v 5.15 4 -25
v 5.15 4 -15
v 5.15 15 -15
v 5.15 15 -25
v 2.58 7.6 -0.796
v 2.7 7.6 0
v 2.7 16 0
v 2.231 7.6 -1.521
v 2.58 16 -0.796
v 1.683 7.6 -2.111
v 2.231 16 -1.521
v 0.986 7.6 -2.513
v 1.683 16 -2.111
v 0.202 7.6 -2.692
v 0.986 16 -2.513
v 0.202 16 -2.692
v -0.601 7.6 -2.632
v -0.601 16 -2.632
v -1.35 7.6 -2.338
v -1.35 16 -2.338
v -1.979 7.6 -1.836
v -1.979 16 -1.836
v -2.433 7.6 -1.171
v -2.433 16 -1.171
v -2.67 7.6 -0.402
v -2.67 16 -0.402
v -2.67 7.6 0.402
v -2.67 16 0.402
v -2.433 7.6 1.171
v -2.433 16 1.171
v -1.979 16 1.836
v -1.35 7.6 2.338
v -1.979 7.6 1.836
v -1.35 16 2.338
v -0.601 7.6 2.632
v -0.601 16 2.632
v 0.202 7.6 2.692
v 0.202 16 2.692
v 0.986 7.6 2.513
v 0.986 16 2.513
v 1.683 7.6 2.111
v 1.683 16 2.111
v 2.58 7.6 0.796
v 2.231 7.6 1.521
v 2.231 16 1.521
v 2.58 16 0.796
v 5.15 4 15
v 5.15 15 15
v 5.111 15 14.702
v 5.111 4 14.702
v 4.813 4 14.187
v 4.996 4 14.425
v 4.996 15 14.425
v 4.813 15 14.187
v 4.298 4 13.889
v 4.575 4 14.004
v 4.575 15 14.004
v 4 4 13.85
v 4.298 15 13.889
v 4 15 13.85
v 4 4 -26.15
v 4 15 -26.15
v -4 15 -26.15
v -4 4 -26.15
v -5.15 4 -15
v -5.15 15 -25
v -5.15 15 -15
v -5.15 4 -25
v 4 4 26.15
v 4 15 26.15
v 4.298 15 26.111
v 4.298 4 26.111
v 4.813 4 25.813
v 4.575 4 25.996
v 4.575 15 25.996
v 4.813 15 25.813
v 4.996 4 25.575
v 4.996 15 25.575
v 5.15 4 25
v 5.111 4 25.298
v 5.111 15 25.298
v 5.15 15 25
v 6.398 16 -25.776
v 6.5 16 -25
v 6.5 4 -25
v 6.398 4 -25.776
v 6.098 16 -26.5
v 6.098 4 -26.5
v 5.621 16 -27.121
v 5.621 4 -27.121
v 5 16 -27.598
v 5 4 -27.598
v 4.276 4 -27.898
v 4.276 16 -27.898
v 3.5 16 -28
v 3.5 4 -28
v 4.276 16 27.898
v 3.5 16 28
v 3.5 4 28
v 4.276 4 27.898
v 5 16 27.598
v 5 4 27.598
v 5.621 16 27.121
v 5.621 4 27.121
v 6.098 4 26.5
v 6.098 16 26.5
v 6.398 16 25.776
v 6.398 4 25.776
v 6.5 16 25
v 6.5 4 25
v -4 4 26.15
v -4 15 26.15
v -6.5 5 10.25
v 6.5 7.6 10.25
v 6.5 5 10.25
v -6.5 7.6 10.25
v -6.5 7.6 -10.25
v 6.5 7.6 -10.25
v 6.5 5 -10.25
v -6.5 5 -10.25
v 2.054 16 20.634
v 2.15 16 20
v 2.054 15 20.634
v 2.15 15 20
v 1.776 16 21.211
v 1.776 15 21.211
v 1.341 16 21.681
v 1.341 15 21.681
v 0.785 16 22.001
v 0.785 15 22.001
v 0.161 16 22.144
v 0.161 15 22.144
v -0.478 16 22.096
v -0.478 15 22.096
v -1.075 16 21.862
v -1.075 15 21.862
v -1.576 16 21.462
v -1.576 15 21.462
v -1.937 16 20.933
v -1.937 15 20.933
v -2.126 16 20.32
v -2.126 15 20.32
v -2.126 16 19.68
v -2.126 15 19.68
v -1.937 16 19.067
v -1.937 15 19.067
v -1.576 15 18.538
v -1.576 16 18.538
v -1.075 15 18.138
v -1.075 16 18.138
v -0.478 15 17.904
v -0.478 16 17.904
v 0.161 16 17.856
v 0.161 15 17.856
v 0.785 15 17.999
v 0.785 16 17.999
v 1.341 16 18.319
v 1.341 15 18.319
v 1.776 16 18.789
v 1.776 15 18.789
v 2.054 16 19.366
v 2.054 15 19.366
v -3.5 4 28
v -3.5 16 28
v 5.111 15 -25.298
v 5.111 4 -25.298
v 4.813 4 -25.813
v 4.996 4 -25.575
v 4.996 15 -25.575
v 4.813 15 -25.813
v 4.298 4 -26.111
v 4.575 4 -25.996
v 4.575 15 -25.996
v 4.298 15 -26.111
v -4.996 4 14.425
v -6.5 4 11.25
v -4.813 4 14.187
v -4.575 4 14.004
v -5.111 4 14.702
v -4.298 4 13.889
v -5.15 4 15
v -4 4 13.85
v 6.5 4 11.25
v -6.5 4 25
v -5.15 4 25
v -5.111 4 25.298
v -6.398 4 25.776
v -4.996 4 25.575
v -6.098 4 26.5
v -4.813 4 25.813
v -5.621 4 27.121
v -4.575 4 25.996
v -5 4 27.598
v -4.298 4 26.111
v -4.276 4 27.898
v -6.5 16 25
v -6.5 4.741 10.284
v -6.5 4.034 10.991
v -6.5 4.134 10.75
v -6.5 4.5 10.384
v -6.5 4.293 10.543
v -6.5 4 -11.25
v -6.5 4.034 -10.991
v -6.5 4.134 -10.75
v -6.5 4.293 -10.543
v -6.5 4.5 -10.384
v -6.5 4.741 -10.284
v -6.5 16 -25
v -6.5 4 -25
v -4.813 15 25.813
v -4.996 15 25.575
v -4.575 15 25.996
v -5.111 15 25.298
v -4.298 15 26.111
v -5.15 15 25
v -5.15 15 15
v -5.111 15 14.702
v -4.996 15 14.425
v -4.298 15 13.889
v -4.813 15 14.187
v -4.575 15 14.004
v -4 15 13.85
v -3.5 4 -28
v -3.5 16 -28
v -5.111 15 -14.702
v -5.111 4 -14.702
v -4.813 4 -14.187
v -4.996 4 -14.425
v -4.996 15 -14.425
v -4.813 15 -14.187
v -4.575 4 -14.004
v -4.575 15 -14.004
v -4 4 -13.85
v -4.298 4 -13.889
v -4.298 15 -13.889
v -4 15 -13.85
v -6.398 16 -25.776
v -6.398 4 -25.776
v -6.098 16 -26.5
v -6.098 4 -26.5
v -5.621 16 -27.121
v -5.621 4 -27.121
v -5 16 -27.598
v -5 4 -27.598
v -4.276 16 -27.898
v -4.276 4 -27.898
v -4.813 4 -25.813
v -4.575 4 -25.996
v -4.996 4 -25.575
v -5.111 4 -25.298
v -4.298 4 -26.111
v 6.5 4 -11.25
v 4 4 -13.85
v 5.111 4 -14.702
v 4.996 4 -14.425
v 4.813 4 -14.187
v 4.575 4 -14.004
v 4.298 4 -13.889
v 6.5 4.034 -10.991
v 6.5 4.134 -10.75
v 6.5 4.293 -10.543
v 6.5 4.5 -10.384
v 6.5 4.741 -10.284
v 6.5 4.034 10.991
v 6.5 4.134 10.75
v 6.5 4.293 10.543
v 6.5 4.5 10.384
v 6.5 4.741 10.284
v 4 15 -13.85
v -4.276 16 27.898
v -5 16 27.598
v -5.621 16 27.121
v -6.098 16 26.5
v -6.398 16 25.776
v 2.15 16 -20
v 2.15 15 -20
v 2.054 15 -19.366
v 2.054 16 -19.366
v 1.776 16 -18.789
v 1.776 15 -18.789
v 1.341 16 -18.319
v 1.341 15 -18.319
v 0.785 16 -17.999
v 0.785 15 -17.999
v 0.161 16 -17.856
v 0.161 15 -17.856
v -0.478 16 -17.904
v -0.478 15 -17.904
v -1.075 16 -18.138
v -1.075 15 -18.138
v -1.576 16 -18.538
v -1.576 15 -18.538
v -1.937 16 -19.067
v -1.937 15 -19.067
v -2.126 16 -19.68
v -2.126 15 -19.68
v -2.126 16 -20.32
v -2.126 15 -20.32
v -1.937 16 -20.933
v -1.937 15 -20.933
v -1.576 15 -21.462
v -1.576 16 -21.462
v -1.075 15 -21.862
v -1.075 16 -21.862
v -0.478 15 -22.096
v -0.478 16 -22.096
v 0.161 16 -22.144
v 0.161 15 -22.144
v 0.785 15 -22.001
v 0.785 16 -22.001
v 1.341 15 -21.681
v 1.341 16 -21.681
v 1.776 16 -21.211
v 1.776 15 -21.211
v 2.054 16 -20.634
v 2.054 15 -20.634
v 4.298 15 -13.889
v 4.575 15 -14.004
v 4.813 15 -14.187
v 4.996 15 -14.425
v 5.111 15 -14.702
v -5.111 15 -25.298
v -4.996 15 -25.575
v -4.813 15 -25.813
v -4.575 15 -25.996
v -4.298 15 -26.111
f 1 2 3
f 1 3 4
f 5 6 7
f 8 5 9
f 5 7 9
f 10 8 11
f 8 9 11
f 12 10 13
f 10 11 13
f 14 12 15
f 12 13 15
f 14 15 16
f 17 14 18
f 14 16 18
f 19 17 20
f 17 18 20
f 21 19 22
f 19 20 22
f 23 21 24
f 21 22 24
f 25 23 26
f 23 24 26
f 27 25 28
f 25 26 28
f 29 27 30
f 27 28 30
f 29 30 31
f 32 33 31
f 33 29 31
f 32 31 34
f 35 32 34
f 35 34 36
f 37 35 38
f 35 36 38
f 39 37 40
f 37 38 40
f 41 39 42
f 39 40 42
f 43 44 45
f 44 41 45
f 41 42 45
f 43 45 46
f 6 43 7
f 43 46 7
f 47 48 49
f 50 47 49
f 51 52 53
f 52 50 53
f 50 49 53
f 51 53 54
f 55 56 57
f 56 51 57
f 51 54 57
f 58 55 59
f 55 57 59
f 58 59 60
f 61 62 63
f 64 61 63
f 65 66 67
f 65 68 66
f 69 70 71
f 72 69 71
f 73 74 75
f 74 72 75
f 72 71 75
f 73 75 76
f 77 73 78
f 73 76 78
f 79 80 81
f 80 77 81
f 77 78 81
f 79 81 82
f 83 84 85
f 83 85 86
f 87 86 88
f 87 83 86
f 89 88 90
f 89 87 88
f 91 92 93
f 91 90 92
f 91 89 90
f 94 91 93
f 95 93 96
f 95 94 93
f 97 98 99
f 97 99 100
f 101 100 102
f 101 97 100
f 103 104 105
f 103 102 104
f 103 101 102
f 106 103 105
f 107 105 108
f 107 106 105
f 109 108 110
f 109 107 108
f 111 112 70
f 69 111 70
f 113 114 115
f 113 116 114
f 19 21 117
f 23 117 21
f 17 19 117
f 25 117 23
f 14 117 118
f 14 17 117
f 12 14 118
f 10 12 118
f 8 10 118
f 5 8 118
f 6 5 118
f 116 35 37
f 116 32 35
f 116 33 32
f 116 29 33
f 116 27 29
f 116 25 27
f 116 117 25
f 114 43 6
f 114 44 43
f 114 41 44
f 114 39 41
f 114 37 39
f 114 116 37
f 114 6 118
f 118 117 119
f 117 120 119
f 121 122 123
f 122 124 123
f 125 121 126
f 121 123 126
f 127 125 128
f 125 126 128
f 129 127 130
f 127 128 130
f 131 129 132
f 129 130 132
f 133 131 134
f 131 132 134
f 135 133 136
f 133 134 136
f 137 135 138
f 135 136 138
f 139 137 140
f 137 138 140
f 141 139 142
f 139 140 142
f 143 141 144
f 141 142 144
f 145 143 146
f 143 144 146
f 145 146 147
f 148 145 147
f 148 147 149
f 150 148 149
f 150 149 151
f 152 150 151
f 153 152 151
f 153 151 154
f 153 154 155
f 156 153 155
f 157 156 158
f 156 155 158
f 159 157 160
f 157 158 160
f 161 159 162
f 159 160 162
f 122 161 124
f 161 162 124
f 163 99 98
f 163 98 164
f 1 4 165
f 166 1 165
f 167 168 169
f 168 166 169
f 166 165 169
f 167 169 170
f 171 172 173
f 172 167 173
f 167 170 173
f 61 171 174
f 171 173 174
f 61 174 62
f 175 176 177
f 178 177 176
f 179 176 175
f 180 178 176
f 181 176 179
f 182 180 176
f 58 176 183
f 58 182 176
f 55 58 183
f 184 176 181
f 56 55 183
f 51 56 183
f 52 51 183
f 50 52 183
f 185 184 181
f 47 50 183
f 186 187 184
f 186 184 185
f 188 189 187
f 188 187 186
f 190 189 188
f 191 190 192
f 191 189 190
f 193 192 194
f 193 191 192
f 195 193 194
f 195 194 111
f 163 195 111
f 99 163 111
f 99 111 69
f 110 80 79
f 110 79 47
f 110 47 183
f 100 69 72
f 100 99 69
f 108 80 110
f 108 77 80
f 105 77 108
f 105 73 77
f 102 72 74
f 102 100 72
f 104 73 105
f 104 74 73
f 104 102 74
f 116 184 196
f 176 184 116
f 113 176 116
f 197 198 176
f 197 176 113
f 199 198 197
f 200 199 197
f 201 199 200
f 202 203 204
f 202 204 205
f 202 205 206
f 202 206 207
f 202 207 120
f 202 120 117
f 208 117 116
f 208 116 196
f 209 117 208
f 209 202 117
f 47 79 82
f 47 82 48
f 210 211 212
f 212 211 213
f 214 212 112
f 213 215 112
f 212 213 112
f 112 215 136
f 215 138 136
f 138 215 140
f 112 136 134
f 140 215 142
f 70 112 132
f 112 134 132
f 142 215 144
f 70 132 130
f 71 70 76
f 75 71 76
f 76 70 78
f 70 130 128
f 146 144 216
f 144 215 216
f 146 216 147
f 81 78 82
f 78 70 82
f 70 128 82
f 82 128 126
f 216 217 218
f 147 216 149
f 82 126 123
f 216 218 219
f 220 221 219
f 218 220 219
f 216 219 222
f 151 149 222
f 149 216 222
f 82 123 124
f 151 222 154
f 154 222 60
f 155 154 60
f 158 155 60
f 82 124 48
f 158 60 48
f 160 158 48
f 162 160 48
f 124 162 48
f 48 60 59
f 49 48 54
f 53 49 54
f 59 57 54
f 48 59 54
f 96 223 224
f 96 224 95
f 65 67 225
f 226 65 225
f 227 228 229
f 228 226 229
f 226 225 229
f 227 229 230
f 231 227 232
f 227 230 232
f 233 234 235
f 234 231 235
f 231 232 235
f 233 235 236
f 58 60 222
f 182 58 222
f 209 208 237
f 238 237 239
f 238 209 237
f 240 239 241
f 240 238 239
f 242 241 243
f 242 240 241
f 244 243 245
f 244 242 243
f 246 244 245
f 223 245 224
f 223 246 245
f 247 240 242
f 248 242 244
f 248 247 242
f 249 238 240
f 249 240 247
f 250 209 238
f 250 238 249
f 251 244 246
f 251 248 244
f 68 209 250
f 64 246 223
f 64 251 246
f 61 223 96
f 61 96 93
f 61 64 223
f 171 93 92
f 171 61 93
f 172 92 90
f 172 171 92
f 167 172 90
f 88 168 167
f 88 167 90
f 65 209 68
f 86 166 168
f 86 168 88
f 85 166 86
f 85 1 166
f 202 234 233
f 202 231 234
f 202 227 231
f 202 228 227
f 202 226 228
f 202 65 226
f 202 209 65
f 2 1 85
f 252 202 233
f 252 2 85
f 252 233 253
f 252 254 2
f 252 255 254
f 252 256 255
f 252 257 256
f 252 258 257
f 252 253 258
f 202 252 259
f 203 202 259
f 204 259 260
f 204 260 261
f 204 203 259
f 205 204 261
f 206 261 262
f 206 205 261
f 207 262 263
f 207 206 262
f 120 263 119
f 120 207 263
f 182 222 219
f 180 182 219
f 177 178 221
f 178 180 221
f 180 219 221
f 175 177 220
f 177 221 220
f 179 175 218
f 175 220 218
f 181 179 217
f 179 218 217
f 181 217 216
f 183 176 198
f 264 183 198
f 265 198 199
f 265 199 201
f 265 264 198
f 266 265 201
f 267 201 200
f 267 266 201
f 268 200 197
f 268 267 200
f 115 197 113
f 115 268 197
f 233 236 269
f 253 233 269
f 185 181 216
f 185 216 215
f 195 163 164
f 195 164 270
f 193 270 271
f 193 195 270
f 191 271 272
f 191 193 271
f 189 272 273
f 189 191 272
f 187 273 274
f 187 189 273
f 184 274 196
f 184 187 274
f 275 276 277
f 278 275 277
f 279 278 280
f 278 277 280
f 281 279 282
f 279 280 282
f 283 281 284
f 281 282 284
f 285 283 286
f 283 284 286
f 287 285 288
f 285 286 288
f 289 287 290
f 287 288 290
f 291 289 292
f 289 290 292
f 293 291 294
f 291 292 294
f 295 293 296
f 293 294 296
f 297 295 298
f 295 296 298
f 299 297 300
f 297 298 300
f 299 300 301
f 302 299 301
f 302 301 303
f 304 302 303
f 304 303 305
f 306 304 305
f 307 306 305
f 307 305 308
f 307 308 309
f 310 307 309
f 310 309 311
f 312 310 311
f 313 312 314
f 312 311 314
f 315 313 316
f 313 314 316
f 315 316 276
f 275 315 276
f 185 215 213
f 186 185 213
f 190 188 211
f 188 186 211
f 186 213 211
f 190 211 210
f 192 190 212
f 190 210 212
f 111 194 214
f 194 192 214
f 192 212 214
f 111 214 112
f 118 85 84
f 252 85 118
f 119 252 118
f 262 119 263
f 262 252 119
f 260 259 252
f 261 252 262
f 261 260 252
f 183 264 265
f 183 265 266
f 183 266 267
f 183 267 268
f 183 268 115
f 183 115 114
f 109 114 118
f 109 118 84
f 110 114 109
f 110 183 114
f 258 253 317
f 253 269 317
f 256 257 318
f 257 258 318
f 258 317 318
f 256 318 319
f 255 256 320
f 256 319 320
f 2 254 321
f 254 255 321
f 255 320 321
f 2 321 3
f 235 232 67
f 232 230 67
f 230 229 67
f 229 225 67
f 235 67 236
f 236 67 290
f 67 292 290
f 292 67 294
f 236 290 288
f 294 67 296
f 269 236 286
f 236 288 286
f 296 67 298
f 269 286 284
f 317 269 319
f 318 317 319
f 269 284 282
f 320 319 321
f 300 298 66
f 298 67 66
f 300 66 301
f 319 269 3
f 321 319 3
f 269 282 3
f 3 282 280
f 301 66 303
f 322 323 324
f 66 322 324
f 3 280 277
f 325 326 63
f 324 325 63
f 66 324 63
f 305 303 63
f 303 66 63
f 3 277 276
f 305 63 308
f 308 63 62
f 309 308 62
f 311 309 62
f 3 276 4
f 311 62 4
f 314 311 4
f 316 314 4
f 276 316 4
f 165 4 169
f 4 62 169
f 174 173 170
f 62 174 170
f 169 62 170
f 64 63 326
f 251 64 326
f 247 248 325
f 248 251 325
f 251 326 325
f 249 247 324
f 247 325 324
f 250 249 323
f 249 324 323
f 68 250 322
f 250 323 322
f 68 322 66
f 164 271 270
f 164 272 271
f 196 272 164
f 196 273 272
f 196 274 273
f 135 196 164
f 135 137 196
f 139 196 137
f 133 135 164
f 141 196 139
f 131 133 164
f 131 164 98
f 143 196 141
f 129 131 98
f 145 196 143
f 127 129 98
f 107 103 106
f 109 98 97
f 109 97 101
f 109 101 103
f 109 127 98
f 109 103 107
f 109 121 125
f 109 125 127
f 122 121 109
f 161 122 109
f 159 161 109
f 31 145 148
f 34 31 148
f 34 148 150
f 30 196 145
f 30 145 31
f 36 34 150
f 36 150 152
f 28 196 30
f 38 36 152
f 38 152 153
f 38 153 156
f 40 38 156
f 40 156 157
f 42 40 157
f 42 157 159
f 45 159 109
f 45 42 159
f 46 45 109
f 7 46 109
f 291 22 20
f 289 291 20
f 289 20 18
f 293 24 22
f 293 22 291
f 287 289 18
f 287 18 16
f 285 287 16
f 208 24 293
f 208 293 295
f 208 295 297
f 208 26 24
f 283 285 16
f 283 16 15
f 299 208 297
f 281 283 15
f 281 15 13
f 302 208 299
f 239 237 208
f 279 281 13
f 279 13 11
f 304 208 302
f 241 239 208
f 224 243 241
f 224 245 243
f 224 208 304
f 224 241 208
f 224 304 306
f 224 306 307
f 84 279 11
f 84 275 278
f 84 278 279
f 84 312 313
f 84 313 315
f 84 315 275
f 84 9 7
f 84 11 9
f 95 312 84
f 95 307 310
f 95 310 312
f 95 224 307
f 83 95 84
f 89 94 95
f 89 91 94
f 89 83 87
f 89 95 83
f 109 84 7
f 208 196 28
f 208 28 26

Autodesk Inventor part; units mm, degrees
ref_plane "YZ Plane" through (0, 0, 0) normal (1, 0, 0) x (0, 1, 0)
ref_plane "XZ Plane" through (0, 0, 0) normal (0, 1, 0) x (-1, 0, 0)
ref_plane "XY Plane" through (0, 0, 0) normal (0, 0, 1) x (1, 0, 0)
sketch "Boceto1" plane through (0, 0, 0) normal (0, 1, 0) x (-1, 0, 0)
  line L0 (-6.5, 28) -> (6.5, 28)
  line L1 (6.5, 28) -> (6.5, -28)
  line L2 (6.5, -28) -> (-6.5, -28)
  line L3 (-6.5, -28) -> (-6.5, 28)
  line L4 (-6.5, 28) -> (6.5, -28) construction
  line L5 (6.5, 28) -> (-6.5, -28) construction
  line L6 (5.15, 26.15) -> (-5.15, 26.15)
  line L7 (-5.15, 26.15) -> (-5.15, 13.85)
  line L8 (-5.15, 13.85) -> (5.15, 13.85)
  line L9 (5.15, 13.85) -> (5.15, 26.15)
  line L10 (5.15, 26.15) -> (-5.15, 13.85) construction
  line L11 (-5.15, 26.15) -> (5.15, 13.85) construction
  line L12 (5.15, -13.85) -> (-5.15, -13.85)
  line L13 (-5.15, -13.85) -> (-5.15, -26.15)
  line L14 (-5.15, -26.15) -> (5.15, -26.15)
  line L15 (5.15, -26.15) -> (5.15, -13.85)
  line L16 (5.15, -13.85) -> (-5.15, -26.15) construction
  line L17 (-5.15, -13.85) -> (5.15, -26.15) construction
  point P0 (0, 0)
  point P1 (0, 20)
  point P2 (0, -20)
  point P3 (0, 20)
  point P4 (0, 0)
  point P5 (0, -20)
  point P6 (0, 0)
  dimension "d0" = 12.3
  dimension "d1" = 10.3
  dimension "d2" = 20
  dimension "d3" = 56
  dimension "d4" = 20
  dimension "d5" = 13
extrude "Extrusión1" add sketch "Boceto1" along normal blind 15
sketch "Boceto2" plane through (0, 15, 0) normal (0, 1, 0) x (1, 0, 0)
  line L0 (6.5, 28) -> (-6.5, 28) projected
  line L1 (-6.5, 28) -> (-6.5, -28) projected
  line L2 (-6.5, -28) -> (6.5, -28) projected
  line L3 (6.5, -28) -> (6.5, 28) projected
  line L4 (-5.15, -26.15) -> (-5.15, -13.85) projected
  line L5 (-5.15, -13.85) -> (5.15, -13.85) projected
  line L6 (5.15, -13.85) -> (5.15, -26.15) projected
  line L7 (5.15, -26.15) -> (-5.15, -26.15) projected
  line L8 (-5.15, 13.85) -> (-5.15, 26.15) projected
  line L9 (-5.15, 26.15) -> (5.15, 26.15) projected
  line L10 (5.15, 26.15) -> (5.15, 13.85) projected
  line L11 (5.15, 13.85) -> (-5.15, 13.85) projected
  point P0 (0, 0)
extrude "Extrusión2" add sketch "Boceto2" along normal blind 1 contours L3 L2 L1 L0 | L4 L5 L6 L7 | L8 L9 L10 L11
sketch "Boceto3" plane through (0, 0, 0) normal (0, -1, 0) x (1, 0, 0)
  circle A0 centre (0, 20) radius 2.15
  circle A1 centre (0, -20) radius 2.15
  line L0 (-5.15, 13.85) -> (5.15, 13.85) projected
  line L1 (5.15, -13.85) -> (-5.15, -13.85) projected
  line L2 (5.15, 13.85) -> (5.15, 26.15) projected
  point P0 (0, 0)
  dimension "d10" = 4.3
  dimension "d11" = 6.15
  dimension "d12" = 6.15
  dimension "d13" = 5.15
extrude "Extrusión3" cut sketch "Boceto3" against normal through all
fillet "Empalme1" radius 1.15 8 edges at (5.15, 7.5, -13.85) (5.15, 7.5, 26.15) (5.15, 7.5, 13.85) (5.15, 7.5, -26.15) (-5.15, 7.5, -26.15) (-5.15, 7.5, 13.85) (-5.15, 7.5, -13.85) (-5.15, 7.5, 26.15)
fillet "Empalme2" radius 3 4 edges at (6.5, 8, -28) (6.5, 8, 28) (-6.5, 8, 28) (-6.5, 8, -28)
sketch "Boceto6" plane through (-6.5, 0, -25) normal (-1, 0, 0) x (0, 0, 1)
  line L0 (35.25, -7) -> (14.75, -7)
  line L1 (14.75, -7) -> (14.75, 7)
  line L2 (14.75, 7) -> (35.25, 7)
  line L3 (35.25, 7) -> (35.25, -7)
  line L4 (35.25, -7) -> (14.75, 7) construction
  line L5 (14.75, -7) -> (35.25, 7) construction
  point P0 (25, 0)
  dimension "d30" = 20.5
  dimension "d31" = 7
extrude "Extrusión6" cut sketch "Boceto6" against normal through all
sketch "Boceto7" plane through (0, 16, 0) normal (0, 1, 0) x (1, 0, 0)
  circle A0 centre (0, 0) radius 2.7
  dimension "d35" = 5.4
extrude "Extrusión7" cut sketch "Boceto7" against normal through all
sketch "Boceto8" plane through (0, 0, 0) normal (0, -1, 0) x (1, 0, 0)
  line L0 (4, -13.85) -> (-4, -13.85) projected
  arc A0 (5.15, -15) -> (4, -13.85) centre (4, -15) ccw projected
  line L1 (5.15, -25) -> (5.15, -15) projected
  arc A1 (4, -26.15) -> (5.15, -25) centre (4, -25) ccw projected
  line L2 (-4, -26.15) -> (4, -26.15) projected
  arc A2 (-5.15, -25) -> (-4, -26.15) centre (-4, -25) ccw projected
  line L3 (-5.15, -15) -> (-5.15, -25) projected
  arc A3 (-4, -13.85) -> (-5.15, -15) centre (-4, -15) ccw projected
  line L4 (6.5, -10.25) -> (-6.5, -10.25) projected
  line L5 (-6.5, -25) -> (-6.5, -10.25) projected
  arc A4 (-6.5, -25) -> (-3.5, -28) centre (-3.5, -25) ccw projected
  line L6 (3.5, -28) -> (-3.5, -28) projected
  arc A5 (3.5, -28) -> (6.5, -25) centre (3.5, -25) ccw projected
  line L7 (6.5, -10.25) -> (6.5, -25) projected
  line L8 (-6.5, 10.25) -> (6.5, 10.25) projected
  line L9 (6.5, 25) -> (6.5, 10.25) projected
  arc A6 (6.5, 25) -> (3.5, 28) centre (3.5, 25) ccw projected
  line L10 (-3.5, 28) -> (3.5, 28) projected
  arc A7 (-3.5, 28) -> (-6.5, 25) centre (-3.5, 25) ccw projected
  line L11 (-6.5, 10.25) -> (-6.5, 25) projected
  line L12 (4, 26.15) -> (-4, 26.15) projected
  arc A8 (5.15, 25) -> (4, 26.15) centre (4, 25) ccw projected
  line L13 (5.15, 15) -> (5.15, 25) projected
  arc A9 (4, 13.85) -> (5.15, 15) centre (4, 15) ccw projected
  line L14 (-4, 13.85) -> (4, 13.85) projected
  arc A10 (-5.15, 15) -> (-4, 13.85) centre (-4, 15) ccw projected
  line L15 (-5.15, 25) -> (-5.15, 15) projected
  arc A11 (-4, 26.15) -> (-5.15, 25) centre (-4, 25) ccw projected
  point P0 (0, 0)
extrude "Extrusión8" cut sketch "Boceto8" against normal blind 4
fillet "Empalme5" radius 1 2 edges at (0, 4, -10.25) (0, 4, 10.25)
sketch "Boceto9" plane through (-6.5, 7, -10.25) normal (0, -1, 0) x (1, 0, 0)
  circle A0 centre (6.5, 10.25) radius 2.7 projected
  line L0 (13, 20.5) -> (13, 0) projected
  line L1 (0, 20.5) -> (13, 20.5) projected
  line L2 (0, 0) -> (0, 20.5) projected
  line L3 (0, 0) -> (13, 0) projected
  point P0 (6.5, 10.25)
extrude "Extrusión9" cut sketch "Boceto9" against normal blind 0.6
sketch "Boceto4" plane through (0, 16, 0) normal (0, 1, 0) x (1, 0, 0)
  circle A0 centre (0, -5) radius 1.7
  circle A1 centre (0, 5) radius 1.7
  point P0 (0, 0)
  dimension "d19" = 3.4
  dimension "d25" = 5
  dimension "d26" = 5
sketch "Boceto5" plane through (0, 0, 0) normal (0, -1, 0) x (1, 0, 0)
  circle A0 centre (0, 5) radius 1.7 projected
  circle A1 centre (0, 5) radius 2.8
  circle A2 centre (0, -5) radius 1.7 projected
  circle A3 centre (0, -5) radius 2.8
  line L0 (3.2332, 5) -> (1.6166, 2.2)
  line L1 (1.6166, 2.2) -> (-1.6166, 2.2)
  line L2 (-1.6166, 2.2) -> (-3.2332, 5)
  line L3 (-3.2332, 5) -> (-1.6166, 7.8)
  line L4 (-1.6166, 7.8) -> (1.6166, 7.8)
  line L5 (1.6166, 7.8) -> (3.2332, 5)
  line L6 (3.2332, -5) -> (1.6166, -7.8)
  line L7 (1.6166, -7.8) -> (-1.6166, -7.8)
  line L8 (-1.6166, -7.8) -> (-3.2332, -5)
  line L9 (-3.2332, -5) -> (-1.6166, -2.2)
  line L10 (-1.6166, -2.2) -> (1.6166, -2.2)
  line L11 (1.6166, -2.2) -> (3.2332, -5)
  point P0 (0, 0)
  dimension "d27" = 5.6
equation "\"d4\" = d2"
properties part number "Base"
